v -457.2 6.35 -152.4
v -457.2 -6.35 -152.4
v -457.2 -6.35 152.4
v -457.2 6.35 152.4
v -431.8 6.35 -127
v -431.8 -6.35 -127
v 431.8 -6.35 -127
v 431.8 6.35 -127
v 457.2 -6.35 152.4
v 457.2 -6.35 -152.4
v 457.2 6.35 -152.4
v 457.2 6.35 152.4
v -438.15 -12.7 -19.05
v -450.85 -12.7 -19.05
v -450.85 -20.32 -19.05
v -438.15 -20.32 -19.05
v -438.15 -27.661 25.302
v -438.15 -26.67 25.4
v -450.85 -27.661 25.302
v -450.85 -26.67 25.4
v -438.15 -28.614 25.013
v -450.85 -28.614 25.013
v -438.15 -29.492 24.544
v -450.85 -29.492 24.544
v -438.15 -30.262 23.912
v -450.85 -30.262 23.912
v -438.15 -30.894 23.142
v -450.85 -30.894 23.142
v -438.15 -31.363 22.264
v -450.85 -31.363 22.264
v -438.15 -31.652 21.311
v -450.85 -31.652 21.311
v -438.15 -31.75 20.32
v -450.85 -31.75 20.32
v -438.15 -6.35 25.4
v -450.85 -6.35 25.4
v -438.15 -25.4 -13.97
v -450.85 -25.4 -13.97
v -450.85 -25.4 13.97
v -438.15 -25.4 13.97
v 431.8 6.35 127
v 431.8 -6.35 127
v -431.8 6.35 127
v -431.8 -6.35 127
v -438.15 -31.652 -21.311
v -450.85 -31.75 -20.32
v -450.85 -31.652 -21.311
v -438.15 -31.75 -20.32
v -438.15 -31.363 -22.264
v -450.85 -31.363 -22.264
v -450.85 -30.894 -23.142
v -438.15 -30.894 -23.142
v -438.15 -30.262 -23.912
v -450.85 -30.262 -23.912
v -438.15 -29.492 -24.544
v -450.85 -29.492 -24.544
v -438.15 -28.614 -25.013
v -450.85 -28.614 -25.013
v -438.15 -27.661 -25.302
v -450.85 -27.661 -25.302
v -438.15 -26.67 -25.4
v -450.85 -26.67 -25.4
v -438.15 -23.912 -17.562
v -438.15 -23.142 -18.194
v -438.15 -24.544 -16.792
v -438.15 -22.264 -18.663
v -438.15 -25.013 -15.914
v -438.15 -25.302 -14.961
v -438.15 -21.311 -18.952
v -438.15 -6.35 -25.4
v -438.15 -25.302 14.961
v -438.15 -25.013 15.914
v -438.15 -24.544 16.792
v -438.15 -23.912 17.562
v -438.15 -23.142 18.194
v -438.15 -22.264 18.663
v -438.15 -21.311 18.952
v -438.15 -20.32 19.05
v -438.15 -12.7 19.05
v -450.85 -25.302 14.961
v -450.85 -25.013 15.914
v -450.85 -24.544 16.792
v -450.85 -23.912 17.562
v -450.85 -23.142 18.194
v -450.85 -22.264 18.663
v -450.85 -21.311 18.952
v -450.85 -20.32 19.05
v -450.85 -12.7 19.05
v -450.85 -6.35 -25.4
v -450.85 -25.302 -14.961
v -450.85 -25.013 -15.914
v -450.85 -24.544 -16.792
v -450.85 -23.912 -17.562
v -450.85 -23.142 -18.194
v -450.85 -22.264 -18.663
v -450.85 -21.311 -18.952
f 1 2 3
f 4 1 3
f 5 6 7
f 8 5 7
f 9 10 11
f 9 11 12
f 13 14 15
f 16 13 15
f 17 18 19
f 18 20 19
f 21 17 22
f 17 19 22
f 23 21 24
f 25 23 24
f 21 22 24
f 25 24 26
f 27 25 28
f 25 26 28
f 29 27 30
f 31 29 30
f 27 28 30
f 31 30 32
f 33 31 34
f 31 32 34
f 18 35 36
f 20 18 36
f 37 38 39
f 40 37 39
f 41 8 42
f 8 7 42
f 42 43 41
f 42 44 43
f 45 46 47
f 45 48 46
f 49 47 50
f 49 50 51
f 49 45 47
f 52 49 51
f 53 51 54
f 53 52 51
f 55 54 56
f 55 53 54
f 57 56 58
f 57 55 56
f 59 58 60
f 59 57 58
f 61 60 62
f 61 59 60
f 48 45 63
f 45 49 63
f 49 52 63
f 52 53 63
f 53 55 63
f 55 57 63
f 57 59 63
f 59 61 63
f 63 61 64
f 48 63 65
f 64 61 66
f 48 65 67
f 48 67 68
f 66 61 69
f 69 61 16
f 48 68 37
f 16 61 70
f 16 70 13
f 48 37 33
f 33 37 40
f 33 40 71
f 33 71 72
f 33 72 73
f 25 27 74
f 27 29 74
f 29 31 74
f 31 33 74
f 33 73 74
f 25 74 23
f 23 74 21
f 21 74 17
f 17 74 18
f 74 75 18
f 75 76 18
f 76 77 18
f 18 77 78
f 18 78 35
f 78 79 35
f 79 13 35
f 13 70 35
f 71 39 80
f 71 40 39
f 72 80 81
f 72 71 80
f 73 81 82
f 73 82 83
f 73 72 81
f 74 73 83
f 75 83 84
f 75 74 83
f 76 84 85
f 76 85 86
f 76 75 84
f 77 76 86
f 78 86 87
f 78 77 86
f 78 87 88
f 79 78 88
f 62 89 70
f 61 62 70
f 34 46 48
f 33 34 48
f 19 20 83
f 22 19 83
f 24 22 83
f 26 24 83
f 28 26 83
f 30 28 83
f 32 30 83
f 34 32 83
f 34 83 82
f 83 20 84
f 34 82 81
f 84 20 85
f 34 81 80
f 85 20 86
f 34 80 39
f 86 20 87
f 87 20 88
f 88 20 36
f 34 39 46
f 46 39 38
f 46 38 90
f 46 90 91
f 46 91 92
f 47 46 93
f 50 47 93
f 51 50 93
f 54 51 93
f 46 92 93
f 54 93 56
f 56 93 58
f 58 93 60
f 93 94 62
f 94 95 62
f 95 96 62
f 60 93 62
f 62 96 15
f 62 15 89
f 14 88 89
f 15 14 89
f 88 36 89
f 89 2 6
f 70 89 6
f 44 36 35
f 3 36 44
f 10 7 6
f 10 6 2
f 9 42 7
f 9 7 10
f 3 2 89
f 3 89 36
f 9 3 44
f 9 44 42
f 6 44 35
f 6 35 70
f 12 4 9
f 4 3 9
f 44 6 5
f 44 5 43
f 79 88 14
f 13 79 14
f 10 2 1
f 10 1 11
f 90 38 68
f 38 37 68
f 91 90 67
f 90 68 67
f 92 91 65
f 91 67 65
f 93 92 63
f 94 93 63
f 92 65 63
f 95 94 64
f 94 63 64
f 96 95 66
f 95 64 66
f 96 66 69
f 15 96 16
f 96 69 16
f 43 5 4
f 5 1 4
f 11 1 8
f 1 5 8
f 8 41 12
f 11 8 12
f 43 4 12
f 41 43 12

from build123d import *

# Parameters (mm, degrees)
F0_W     = 914.4
F0_H     = 304.8
F0_W_2   = 863.6
F0_H_2   = 254
F1_DEPTH = 6.35
F3_DEPTH = 25.4
F5_DEPTH = 25.4
F6_R     = 5.08
F7_R     = 5.08


with BuildPart() as f1:
    # F0 (on Front) → F1 (new body, symmetric)
    with BuildSketch(Plane.XZ):
        Rectangle(F0_W, F0_H)
        Rectangle(F0_W_2, F0_H_2, mode=Mode.SUBTRACT)
    extrude(amount=F1_DEPTH, both=True)

    # F2 (on face) → F3 (join)
    with BuildSketch(Plane.XZ.offset(6.35)):
        Polygon((-438.15, 0), (-438.15, 25.4), (-450.85, 25.4), (-450.85, -25.4), (-438.15, -25.4), align=None)
    extrude(amount=F3_DEPTH)

    # F4 (on face) → F5 (cut)
    with BuildSketch(Plane(origin=(-450.85, 0, 0), x_dir=(0, -1, 0), z_dir=(-1, 0, 0))):
        Polygon((25.4, 0), (25.4, 19.05), (12.7, 19.05), (12.7, -19.05), (25.4, -19.05), align=None)
    extrude(amount=-F5_DEPTH, mode=Mode.SUBTRACT)

    # F6
    f6_edges = [f1.edges().sort_by_distance(p)[0] for p in [
        (-444.5, -25.4, 19.05),
        (-444.5, -25.4, -19.05),
    ]]
    fillet(f6_edges, radius=F6_R)

    # F7
    f7_edges = [f1.edges().sort_by_distance(p)[0] for p in [
        (-444.5, -31.75, 25.4),
        (-444.5, -31.75, -25.4),
    ]]
    fillet(f7_edges, radius=F7_R)


solid = f1.part
